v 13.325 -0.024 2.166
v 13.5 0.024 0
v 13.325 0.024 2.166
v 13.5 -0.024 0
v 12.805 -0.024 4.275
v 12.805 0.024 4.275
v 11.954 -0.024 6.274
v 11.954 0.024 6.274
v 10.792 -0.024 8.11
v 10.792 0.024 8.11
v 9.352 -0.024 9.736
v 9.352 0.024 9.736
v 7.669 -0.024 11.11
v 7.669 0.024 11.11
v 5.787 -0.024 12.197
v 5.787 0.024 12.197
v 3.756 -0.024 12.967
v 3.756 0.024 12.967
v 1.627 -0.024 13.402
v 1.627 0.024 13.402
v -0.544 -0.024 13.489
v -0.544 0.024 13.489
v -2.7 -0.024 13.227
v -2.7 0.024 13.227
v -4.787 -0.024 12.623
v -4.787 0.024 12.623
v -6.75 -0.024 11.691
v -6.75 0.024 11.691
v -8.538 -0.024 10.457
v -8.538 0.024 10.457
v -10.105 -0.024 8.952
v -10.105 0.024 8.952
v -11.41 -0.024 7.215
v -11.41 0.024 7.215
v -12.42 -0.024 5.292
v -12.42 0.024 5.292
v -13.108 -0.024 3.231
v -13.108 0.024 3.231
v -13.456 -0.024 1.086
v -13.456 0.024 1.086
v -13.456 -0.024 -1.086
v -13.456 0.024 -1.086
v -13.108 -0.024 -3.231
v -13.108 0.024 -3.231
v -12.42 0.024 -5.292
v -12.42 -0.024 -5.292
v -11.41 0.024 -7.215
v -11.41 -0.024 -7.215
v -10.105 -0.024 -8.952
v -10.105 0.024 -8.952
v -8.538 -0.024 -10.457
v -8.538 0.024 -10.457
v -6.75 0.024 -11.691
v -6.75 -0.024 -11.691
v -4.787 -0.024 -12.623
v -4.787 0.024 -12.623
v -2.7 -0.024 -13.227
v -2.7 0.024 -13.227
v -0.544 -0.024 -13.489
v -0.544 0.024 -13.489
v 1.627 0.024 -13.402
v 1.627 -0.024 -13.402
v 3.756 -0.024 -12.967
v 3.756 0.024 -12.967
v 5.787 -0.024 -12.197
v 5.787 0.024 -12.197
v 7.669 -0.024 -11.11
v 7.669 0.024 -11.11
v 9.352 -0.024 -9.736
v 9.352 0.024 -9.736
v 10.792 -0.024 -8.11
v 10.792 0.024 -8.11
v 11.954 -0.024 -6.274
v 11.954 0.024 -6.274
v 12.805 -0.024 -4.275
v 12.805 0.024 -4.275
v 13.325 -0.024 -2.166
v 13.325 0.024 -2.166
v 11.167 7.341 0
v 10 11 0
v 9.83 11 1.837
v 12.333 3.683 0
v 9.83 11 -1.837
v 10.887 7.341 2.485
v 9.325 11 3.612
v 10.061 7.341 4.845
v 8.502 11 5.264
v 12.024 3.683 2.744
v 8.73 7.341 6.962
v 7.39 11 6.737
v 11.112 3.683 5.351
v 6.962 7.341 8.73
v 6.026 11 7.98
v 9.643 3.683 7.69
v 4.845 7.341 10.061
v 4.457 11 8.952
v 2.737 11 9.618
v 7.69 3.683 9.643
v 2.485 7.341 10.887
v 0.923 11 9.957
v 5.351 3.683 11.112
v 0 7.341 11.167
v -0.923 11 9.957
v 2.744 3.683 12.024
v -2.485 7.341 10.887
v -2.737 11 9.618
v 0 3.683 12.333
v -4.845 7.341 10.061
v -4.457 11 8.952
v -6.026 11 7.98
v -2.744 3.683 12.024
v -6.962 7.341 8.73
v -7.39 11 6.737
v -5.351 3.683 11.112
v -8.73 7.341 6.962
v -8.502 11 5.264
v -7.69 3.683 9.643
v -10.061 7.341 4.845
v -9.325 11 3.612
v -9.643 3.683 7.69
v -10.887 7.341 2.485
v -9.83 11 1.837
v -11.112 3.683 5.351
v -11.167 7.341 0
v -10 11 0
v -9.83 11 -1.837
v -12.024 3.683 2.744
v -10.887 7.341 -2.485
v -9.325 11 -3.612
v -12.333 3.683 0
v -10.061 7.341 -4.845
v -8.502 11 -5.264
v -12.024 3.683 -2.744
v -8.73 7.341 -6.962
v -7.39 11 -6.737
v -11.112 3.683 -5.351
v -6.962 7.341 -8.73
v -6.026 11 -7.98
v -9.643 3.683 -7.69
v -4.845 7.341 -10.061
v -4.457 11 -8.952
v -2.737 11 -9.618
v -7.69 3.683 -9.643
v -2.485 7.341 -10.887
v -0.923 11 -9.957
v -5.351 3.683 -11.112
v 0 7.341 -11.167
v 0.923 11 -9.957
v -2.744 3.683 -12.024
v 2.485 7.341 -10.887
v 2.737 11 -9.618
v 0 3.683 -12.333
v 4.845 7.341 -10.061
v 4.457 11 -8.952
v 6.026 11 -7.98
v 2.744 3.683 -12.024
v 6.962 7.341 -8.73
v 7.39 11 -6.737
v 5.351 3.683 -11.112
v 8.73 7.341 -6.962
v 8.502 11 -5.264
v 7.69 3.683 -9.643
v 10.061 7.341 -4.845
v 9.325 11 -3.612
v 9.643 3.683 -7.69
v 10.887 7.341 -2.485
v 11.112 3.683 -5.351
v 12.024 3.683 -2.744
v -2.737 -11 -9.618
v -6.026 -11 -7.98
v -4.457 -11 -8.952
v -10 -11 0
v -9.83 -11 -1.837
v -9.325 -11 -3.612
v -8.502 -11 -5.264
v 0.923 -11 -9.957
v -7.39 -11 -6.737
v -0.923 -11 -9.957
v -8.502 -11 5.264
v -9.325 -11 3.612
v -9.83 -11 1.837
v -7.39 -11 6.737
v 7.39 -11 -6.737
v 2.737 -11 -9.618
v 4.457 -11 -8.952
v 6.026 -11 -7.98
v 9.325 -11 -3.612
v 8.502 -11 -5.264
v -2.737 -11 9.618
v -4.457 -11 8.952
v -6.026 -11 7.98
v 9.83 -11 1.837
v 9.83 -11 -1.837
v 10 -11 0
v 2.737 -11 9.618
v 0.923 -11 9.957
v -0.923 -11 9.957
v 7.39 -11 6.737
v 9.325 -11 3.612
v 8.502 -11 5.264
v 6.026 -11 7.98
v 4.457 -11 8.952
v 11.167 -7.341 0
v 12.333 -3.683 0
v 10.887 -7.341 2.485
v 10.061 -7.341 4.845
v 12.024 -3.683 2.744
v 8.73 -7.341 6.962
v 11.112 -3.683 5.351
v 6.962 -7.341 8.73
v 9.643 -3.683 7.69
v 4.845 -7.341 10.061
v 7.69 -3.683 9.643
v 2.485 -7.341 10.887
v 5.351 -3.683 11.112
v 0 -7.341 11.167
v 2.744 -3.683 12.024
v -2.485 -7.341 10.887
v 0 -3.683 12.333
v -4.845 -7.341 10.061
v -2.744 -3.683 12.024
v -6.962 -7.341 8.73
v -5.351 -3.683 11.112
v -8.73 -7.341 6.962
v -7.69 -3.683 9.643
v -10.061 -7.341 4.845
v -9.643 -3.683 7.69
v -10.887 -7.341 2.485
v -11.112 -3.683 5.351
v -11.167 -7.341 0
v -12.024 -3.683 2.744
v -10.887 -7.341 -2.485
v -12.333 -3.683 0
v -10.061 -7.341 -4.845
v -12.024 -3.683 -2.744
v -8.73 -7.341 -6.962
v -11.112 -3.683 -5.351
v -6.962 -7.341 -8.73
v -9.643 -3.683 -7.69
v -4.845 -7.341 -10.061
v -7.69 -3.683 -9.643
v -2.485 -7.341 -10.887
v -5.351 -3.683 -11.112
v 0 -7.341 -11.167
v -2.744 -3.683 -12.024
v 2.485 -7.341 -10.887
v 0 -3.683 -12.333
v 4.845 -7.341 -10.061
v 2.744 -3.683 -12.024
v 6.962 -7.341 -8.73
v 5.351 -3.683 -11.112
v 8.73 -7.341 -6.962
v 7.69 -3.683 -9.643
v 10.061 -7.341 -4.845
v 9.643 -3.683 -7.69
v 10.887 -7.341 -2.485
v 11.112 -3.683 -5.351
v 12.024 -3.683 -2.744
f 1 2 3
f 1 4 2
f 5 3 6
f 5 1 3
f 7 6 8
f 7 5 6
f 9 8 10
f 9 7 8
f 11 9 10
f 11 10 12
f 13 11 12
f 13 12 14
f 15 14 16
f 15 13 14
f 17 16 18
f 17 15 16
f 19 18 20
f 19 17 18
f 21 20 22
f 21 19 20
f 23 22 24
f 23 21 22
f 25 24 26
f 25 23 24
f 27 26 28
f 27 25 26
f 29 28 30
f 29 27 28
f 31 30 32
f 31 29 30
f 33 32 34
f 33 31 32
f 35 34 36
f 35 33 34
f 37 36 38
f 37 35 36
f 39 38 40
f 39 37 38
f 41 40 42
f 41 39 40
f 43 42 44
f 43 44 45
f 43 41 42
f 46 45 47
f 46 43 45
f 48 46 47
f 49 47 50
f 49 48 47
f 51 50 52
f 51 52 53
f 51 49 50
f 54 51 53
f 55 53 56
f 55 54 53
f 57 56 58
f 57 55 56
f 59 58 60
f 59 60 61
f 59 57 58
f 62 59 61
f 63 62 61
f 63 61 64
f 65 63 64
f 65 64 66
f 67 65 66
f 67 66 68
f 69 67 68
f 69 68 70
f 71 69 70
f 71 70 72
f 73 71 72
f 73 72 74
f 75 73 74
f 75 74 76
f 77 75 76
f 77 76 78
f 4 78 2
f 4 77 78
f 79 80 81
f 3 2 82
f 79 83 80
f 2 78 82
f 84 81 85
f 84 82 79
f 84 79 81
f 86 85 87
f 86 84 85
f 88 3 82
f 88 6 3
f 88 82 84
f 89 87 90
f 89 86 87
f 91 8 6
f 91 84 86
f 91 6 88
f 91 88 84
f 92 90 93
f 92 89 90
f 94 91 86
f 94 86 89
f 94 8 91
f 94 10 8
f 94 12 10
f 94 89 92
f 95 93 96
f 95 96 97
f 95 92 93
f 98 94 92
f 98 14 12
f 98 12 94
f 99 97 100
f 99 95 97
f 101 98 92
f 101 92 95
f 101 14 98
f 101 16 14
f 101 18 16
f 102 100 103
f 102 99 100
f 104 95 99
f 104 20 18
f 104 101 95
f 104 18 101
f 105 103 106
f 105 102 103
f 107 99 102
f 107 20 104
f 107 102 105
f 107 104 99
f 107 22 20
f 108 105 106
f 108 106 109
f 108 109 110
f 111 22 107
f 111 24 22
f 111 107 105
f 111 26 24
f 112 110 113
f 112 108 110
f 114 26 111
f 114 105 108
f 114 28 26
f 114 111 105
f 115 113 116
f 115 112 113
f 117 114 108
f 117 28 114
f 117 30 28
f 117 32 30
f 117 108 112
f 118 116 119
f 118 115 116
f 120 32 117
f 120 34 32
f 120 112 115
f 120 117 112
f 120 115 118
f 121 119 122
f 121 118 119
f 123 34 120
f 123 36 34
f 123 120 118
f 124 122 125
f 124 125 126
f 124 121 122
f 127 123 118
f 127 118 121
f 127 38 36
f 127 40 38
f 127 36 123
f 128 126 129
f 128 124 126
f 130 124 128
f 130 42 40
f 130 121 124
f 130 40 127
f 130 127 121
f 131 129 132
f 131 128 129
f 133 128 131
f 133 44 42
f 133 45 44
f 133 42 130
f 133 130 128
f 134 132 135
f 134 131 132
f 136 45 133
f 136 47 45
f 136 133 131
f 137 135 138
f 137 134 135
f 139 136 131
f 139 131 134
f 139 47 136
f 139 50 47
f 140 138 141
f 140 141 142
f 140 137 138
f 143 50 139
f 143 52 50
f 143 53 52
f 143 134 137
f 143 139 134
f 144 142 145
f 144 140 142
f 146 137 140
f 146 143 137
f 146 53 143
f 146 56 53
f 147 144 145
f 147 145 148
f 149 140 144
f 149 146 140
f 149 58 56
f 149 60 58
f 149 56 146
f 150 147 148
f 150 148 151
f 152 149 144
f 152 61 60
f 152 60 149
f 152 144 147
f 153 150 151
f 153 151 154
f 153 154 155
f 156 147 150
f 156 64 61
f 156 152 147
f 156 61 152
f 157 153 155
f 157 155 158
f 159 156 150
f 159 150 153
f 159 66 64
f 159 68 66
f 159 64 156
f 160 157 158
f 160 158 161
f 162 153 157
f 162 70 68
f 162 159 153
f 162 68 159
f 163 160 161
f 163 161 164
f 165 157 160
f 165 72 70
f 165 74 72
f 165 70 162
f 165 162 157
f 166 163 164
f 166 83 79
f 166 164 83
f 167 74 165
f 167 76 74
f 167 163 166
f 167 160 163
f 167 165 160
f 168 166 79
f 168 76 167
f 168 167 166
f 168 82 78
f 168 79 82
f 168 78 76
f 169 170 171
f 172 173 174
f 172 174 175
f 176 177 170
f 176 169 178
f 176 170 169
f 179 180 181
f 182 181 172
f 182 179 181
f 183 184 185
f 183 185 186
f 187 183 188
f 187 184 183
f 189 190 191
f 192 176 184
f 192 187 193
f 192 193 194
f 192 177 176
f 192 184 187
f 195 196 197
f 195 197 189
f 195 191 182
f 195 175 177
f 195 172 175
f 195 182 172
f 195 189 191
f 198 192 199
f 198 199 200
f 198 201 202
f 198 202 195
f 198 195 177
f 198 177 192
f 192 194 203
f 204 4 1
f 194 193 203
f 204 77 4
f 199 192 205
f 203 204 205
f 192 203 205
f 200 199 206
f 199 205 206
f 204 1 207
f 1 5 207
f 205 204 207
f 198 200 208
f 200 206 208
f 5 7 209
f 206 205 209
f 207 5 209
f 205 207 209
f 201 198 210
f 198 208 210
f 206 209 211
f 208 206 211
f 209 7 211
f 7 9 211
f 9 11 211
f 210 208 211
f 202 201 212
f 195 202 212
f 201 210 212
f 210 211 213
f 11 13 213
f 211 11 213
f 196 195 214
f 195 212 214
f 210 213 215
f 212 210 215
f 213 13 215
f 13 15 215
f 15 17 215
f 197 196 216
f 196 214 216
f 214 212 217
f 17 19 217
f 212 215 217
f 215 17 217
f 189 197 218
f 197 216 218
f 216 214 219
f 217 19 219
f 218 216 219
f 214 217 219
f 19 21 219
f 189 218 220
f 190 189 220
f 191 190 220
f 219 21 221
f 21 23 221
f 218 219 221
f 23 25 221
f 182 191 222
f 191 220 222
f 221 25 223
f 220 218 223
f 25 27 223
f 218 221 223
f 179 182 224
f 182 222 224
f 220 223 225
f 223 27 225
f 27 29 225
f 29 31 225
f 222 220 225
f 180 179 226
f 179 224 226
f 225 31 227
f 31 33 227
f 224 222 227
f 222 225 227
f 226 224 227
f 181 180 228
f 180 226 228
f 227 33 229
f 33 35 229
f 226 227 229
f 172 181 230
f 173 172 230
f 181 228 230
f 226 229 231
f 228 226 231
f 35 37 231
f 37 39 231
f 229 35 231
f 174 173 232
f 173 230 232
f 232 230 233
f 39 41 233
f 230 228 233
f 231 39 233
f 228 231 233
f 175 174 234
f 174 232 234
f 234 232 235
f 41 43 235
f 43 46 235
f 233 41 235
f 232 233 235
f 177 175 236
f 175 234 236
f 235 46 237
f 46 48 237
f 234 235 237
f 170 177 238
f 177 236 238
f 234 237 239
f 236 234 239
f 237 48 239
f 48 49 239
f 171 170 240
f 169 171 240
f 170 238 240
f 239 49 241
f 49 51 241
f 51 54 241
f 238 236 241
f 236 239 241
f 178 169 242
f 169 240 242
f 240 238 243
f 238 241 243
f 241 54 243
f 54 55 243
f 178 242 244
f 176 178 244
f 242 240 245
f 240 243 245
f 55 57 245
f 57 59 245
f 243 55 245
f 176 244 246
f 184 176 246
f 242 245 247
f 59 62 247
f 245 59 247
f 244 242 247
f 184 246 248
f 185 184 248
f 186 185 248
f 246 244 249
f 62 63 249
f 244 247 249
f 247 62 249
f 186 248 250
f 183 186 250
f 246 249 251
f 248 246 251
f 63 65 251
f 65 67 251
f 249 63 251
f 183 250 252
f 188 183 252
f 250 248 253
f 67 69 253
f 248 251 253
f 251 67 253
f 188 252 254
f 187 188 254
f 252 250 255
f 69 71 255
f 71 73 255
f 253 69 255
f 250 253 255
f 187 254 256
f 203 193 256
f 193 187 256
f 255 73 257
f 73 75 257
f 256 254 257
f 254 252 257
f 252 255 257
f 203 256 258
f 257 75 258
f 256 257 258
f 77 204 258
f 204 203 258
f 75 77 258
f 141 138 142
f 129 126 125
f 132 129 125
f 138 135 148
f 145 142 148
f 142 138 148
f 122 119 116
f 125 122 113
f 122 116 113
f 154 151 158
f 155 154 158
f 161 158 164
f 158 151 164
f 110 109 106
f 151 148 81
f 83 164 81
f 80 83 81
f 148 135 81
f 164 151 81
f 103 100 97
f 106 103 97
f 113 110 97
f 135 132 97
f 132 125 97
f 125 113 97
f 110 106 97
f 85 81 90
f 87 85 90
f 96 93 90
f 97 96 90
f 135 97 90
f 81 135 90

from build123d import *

# Parameters (mm, degrees)
F0_R      = 13.5
F1_DEPTH  = 0.024
F3_R      = 10
F1_FACE_R = 13.5


with BuildPart() as f1:
    # F0 (on Front) → F1 (new body)
    with BuildSketch(Plane.XZ):
        Circle(F0_R)
    extrude(amount=F1_DEPTH)

    # F3 (on offset) → F4 section 0
    with BuildSketch(Plane.XZ.offset(11)):
        Circle(F3_R)
    # F1_face (on face) → F4 section 1
    with BuildSketch(Plane.XZ.offset(0.024)):
        Circle(F1_FACE_R)
    loft()

    # F5: F1 across plane


with BuildPart() as f1_1:
    add(f1.part)
    add(f1.part.mirror(Plane.XZ))


solid = f1_1.part
